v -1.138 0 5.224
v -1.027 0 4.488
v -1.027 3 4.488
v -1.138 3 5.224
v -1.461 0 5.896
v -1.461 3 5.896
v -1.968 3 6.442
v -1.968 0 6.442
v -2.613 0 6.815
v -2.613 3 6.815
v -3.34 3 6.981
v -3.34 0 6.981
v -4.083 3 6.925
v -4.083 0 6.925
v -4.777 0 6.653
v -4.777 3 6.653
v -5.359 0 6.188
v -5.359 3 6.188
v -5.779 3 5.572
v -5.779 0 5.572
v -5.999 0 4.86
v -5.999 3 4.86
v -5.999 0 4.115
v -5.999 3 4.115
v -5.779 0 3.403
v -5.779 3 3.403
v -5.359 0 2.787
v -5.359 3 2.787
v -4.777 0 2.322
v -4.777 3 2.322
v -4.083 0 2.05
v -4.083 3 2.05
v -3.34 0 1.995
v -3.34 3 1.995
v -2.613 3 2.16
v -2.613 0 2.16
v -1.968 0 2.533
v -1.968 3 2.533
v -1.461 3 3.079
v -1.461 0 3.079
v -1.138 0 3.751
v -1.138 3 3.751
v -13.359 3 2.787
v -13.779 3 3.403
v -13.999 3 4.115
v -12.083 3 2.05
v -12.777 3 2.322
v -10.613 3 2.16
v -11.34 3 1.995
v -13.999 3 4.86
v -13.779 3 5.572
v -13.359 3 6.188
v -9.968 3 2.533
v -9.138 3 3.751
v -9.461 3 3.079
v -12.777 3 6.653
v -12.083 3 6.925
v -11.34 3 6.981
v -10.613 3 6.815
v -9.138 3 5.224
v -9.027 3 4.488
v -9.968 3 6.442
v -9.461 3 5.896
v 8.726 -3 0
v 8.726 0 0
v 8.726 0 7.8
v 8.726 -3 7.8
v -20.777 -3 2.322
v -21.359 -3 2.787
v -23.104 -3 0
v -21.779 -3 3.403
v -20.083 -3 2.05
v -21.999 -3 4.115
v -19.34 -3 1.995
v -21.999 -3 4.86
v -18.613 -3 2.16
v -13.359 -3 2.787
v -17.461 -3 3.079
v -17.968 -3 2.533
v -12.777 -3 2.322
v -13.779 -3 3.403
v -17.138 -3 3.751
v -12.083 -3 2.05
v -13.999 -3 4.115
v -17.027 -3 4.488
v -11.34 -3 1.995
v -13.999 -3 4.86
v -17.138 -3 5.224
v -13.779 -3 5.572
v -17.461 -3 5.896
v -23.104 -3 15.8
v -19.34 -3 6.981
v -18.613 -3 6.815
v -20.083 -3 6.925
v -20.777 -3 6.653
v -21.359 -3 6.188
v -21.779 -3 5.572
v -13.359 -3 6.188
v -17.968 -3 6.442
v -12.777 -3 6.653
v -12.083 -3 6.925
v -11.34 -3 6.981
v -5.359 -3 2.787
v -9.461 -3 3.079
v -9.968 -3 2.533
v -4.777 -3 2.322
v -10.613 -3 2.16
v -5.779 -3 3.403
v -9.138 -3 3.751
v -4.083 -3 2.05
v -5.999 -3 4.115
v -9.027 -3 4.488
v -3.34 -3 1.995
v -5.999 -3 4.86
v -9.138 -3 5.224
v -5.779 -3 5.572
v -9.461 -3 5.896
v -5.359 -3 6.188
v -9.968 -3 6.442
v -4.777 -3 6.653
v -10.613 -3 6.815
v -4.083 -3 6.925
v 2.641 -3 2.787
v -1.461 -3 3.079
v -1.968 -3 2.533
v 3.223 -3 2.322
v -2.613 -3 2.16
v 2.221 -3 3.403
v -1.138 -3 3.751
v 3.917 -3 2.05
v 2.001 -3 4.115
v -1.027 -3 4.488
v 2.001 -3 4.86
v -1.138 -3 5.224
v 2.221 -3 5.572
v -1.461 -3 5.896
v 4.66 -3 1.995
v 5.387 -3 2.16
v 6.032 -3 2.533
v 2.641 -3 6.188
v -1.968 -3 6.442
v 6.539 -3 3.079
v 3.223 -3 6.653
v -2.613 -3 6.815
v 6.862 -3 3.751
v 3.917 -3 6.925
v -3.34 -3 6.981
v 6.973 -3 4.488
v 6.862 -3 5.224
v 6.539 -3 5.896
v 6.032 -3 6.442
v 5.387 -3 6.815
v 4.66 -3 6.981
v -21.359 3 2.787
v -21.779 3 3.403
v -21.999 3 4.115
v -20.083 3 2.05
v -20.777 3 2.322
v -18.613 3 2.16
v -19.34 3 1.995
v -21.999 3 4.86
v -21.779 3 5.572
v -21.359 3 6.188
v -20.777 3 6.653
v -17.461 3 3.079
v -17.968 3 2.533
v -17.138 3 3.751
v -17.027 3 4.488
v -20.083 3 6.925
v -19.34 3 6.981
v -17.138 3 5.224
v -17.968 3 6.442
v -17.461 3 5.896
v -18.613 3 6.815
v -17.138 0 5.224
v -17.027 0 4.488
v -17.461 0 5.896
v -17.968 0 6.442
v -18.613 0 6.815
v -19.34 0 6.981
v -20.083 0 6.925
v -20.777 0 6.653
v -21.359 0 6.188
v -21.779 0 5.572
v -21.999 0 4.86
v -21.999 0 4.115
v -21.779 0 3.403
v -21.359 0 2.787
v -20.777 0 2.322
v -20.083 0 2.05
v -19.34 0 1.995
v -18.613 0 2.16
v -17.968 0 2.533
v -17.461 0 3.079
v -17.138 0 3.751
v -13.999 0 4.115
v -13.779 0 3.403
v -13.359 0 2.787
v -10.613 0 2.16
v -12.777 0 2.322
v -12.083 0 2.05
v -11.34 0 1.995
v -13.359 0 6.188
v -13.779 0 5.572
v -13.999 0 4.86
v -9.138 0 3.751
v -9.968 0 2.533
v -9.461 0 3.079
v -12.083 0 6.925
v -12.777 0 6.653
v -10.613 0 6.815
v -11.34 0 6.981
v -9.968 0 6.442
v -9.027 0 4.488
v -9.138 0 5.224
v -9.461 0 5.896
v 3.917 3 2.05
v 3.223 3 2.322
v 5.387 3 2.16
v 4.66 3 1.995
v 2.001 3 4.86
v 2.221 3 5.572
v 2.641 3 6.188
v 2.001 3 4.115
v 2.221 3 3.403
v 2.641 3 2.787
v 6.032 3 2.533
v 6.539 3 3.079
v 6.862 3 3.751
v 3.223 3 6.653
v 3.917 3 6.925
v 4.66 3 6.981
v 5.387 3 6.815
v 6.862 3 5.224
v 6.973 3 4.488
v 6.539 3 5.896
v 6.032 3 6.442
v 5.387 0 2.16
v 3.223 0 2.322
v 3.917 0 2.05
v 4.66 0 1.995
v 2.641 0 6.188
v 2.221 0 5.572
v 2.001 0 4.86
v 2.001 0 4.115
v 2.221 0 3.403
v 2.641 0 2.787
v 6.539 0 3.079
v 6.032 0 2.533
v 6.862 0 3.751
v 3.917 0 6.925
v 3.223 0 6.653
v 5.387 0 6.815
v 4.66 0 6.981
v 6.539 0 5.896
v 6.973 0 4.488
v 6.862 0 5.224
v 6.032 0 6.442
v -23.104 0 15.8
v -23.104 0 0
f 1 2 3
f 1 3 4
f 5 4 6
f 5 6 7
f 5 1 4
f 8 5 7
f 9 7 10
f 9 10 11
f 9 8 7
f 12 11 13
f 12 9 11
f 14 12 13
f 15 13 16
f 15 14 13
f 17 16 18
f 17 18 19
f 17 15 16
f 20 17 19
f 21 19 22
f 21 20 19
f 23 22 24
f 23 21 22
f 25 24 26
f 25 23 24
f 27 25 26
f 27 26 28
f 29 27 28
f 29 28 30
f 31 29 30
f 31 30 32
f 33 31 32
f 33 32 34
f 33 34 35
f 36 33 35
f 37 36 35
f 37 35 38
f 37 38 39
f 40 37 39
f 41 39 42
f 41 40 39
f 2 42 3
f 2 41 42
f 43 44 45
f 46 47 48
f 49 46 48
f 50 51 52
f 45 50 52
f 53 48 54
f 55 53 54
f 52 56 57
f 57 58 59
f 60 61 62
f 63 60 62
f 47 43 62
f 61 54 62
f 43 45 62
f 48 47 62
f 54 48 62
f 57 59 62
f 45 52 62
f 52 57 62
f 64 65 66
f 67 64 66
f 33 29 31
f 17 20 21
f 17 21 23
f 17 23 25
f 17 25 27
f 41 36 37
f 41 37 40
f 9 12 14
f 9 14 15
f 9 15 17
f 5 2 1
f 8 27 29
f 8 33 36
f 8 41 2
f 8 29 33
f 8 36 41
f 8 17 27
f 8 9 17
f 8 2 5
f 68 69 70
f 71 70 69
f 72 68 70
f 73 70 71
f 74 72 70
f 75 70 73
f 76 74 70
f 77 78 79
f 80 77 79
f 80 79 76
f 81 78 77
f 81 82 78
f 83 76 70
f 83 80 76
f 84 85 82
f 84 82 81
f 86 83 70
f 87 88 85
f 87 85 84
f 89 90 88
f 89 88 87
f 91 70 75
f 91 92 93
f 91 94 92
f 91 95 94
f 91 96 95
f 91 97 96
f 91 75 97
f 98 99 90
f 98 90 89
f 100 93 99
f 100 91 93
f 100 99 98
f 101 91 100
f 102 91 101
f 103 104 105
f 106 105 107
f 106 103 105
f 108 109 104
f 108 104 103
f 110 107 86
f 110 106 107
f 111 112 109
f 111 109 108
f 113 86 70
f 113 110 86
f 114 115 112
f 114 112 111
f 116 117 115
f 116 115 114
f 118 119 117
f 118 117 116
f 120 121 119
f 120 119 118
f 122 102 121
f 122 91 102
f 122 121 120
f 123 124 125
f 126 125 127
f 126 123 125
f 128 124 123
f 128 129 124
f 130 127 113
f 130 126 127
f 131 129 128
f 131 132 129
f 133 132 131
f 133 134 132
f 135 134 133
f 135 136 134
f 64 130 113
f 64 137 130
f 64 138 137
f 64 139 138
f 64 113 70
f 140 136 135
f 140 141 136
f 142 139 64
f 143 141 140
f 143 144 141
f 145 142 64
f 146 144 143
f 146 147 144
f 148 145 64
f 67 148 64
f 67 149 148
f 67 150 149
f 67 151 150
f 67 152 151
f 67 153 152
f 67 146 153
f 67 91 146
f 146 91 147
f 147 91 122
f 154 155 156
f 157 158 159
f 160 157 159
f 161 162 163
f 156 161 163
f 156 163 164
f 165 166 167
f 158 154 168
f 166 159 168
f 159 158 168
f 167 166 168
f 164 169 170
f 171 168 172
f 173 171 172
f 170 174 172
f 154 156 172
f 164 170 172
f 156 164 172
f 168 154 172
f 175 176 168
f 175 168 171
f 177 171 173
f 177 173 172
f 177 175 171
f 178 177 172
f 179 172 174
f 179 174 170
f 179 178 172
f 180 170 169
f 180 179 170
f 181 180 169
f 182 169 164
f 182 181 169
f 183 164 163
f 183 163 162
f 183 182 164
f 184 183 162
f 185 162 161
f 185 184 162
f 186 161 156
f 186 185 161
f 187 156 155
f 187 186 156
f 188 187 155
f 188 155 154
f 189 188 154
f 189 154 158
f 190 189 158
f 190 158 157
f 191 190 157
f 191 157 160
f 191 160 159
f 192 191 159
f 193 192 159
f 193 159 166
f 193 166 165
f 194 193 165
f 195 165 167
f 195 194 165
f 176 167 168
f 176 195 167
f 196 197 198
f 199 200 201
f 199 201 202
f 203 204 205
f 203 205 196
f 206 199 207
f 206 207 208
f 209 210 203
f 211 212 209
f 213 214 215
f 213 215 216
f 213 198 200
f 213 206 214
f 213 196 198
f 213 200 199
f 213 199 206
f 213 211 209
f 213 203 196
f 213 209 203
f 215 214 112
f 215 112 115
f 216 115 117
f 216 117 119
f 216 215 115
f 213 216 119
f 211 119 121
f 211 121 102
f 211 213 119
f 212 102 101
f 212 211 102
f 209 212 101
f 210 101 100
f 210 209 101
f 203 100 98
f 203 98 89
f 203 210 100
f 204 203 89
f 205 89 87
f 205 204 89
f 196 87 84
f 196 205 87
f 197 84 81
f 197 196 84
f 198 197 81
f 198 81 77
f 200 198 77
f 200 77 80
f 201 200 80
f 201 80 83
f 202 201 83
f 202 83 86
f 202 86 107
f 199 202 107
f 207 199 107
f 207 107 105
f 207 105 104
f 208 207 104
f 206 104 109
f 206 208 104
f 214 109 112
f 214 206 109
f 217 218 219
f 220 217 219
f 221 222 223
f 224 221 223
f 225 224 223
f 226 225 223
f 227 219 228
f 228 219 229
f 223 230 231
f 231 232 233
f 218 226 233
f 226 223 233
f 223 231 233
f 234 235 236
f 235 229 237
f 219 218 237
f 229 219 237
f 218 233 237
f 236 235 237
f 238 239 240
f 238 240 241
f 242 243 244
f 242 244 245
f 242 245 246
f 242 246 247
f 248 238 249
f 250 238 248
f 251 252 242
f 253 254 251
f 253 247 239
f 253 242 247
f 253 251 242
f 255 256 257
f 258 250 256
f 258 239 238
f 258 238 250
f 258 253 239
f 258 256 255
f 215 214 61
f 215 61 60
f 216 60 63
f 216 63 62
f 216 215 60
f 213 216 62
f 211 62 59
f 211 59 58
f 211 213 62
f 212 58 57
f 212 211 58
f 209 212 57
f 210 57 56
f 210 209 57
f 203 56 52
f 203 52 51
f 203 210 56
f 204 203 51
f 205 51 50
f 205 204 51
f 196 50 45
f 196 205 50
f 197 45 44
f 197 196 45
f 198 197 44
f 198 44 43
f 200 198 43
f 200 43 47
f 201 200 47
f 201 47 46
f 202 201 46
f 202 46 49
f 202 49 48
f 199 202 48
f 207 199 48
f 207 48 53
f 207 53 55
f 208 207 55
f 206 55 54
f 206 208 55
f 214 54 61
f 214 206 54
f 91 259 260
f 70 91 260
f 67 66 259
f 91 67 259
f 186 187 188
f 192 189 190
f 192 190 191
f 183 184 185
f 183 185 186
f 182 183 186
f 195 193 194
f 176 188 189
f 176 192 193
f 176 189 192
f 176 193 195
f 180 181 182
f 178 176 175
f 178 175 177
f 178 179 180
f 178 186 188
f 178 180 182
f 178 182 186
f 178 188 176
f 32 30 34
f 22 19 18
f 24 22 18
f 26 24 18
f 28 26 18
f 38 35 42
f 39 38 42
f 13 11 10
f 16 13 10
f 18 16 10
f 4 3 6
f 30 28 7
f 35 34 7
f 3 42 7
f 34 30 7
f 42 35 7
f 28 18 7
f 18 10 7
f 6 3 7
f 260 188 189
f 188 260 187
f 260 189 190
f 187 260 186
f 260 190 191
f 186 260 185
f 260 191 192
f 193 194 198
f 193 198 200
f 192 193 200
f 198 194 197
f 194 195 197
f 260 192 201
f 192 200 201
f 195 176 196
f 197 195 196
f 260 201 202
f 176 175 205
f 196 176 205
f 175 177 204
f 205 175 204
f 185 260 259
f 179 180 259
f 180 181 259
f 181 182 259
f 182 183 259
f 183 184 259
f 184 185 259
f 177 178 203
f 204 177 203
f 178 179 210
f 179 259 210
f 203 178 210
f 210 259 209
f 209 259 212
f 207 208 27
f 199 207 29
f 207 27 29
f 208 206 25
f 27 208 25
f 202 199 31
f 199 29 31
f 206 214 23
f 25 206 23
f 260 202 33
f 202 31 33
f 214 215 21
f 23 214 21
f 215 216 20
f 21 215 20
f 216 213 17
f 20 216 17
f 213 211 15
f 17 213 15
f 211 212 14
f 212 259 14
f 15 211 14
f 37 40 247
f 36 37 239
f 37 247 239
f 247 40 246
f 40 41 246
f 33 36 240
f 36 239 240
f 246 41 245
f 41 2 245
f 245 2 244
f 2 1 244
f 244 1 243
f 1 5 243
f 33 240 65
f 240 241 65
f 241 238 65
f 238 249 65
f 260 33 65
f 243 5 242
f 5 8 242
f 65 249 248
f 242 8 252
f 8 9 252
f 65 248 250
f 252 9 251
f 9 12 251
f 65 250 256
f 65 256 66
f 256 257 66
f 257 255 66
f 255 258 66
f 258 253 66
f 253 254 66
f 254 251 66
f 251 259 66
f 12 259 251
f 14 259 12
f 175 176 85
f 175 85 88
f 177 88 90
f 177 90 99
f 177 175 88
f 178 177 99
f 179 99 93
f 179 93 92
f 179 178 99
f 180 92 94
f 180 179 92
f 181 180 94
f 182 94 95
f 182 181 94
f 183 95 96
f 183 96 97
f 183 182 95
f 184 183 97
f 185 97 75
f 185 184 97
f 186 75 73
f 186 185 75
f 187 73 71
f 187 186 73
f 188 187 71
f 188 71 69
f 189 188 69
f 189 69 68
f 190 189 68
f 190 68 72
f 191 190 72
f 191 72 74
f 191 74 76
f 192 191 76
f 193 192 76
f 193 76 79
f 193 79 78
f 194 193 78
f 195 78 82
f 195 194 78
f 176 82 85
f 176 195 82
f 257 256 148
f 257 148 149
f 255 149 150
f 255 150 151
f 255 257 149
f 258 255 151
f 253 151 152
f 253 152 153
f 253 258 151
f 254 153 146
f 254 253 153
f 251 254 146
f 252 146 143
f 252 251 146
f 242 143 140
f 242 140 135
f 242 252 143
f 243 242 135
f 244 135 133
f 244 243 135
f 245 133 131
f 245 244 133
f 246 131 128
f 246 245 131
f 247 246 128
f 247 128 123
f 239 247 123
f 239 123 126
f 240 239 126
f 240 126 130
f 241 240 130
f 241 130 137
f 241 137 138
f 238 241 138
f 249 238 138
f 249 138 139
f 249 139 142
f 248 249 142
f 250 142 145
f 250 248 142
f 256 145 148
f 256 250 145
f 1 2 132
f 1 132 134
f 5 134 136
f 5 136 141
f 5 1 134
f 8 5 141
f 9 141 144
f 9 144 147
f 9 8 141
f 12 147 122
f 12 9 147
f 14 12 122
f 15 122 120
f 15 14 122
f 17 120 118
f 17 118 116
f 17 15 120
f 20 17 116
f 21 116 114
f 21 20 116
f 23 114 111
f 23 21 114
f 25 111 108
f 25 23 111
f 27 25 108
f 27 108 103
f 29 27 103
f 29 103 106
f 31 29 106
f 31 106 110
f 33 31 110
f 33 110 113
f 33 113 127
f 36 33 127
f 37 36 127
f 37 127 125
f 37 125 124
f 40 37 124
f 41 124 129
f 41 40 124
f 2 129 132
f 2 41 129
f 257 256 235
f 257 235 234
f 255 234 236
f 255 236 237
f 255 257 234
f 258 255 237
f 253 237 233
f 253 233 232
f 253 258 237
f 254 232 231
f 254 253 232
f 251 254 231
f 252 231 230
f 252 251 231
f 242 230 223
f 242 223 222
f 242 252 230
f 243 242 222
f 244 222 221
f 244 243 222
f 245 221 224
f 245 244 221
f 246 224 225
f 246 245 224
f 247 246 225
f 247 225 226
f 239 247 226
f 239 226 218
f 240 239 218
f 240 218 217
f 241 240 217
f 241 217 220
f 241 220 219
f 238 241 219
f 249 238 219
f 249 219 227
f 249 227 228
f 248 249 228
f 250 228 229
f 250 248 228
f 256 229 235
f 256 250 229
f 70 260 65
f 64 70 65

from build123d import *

# Parameters (mm, degrees)
F0_R     = 2.5
F1_DEPTH = 3
F2_DEPTH = 3


with BuildPart() as f1:
    # F0 (on Front) → F1 (new body)
    with BuildSketch(Plane.XZ):
        Polygon((-23.10419, 15.8), (-23.10419, 0), (8.72581, 0), (8.72581, 7.8), align=None)
        with Locations((-19.526565, 4.487517)):
            Circle(F0_R, mode=Mode.SUBTRACT)
        with Locations((-11.526565, 4.487517)):
            Circle(F0_R, mode=Mode.SUBTRACT)
        with Locations((-3.526565, 4.487517)):
            Circle(F0_R, mode=Mode.SUBTRACT)
        with Locations((4.473435, 4.487517)):
            Circle(F0_R, mode=Mode.SUBTRACT)
    extrude(amount=F1_DEPTH)


with BuildPart() as f2:
    # F0 (on Front) → F2 (new body)
    with BuildSketch(Plane.XZ):
        with Locations((-19.526565, 4.487517)):
            Circle(F0_R)
        with Locations((-11.526565, 4.487517)):
            Circle(F0_R)
        with Locations((-3.526565, 4.487517)):
            Circle(F0_R)
        with Locations((4.473435, 4.487517)):
            Circle(F0_R)
    extrude(amount=-F2_DEPTH)


solid = Compound([f1.part, f2.part])
